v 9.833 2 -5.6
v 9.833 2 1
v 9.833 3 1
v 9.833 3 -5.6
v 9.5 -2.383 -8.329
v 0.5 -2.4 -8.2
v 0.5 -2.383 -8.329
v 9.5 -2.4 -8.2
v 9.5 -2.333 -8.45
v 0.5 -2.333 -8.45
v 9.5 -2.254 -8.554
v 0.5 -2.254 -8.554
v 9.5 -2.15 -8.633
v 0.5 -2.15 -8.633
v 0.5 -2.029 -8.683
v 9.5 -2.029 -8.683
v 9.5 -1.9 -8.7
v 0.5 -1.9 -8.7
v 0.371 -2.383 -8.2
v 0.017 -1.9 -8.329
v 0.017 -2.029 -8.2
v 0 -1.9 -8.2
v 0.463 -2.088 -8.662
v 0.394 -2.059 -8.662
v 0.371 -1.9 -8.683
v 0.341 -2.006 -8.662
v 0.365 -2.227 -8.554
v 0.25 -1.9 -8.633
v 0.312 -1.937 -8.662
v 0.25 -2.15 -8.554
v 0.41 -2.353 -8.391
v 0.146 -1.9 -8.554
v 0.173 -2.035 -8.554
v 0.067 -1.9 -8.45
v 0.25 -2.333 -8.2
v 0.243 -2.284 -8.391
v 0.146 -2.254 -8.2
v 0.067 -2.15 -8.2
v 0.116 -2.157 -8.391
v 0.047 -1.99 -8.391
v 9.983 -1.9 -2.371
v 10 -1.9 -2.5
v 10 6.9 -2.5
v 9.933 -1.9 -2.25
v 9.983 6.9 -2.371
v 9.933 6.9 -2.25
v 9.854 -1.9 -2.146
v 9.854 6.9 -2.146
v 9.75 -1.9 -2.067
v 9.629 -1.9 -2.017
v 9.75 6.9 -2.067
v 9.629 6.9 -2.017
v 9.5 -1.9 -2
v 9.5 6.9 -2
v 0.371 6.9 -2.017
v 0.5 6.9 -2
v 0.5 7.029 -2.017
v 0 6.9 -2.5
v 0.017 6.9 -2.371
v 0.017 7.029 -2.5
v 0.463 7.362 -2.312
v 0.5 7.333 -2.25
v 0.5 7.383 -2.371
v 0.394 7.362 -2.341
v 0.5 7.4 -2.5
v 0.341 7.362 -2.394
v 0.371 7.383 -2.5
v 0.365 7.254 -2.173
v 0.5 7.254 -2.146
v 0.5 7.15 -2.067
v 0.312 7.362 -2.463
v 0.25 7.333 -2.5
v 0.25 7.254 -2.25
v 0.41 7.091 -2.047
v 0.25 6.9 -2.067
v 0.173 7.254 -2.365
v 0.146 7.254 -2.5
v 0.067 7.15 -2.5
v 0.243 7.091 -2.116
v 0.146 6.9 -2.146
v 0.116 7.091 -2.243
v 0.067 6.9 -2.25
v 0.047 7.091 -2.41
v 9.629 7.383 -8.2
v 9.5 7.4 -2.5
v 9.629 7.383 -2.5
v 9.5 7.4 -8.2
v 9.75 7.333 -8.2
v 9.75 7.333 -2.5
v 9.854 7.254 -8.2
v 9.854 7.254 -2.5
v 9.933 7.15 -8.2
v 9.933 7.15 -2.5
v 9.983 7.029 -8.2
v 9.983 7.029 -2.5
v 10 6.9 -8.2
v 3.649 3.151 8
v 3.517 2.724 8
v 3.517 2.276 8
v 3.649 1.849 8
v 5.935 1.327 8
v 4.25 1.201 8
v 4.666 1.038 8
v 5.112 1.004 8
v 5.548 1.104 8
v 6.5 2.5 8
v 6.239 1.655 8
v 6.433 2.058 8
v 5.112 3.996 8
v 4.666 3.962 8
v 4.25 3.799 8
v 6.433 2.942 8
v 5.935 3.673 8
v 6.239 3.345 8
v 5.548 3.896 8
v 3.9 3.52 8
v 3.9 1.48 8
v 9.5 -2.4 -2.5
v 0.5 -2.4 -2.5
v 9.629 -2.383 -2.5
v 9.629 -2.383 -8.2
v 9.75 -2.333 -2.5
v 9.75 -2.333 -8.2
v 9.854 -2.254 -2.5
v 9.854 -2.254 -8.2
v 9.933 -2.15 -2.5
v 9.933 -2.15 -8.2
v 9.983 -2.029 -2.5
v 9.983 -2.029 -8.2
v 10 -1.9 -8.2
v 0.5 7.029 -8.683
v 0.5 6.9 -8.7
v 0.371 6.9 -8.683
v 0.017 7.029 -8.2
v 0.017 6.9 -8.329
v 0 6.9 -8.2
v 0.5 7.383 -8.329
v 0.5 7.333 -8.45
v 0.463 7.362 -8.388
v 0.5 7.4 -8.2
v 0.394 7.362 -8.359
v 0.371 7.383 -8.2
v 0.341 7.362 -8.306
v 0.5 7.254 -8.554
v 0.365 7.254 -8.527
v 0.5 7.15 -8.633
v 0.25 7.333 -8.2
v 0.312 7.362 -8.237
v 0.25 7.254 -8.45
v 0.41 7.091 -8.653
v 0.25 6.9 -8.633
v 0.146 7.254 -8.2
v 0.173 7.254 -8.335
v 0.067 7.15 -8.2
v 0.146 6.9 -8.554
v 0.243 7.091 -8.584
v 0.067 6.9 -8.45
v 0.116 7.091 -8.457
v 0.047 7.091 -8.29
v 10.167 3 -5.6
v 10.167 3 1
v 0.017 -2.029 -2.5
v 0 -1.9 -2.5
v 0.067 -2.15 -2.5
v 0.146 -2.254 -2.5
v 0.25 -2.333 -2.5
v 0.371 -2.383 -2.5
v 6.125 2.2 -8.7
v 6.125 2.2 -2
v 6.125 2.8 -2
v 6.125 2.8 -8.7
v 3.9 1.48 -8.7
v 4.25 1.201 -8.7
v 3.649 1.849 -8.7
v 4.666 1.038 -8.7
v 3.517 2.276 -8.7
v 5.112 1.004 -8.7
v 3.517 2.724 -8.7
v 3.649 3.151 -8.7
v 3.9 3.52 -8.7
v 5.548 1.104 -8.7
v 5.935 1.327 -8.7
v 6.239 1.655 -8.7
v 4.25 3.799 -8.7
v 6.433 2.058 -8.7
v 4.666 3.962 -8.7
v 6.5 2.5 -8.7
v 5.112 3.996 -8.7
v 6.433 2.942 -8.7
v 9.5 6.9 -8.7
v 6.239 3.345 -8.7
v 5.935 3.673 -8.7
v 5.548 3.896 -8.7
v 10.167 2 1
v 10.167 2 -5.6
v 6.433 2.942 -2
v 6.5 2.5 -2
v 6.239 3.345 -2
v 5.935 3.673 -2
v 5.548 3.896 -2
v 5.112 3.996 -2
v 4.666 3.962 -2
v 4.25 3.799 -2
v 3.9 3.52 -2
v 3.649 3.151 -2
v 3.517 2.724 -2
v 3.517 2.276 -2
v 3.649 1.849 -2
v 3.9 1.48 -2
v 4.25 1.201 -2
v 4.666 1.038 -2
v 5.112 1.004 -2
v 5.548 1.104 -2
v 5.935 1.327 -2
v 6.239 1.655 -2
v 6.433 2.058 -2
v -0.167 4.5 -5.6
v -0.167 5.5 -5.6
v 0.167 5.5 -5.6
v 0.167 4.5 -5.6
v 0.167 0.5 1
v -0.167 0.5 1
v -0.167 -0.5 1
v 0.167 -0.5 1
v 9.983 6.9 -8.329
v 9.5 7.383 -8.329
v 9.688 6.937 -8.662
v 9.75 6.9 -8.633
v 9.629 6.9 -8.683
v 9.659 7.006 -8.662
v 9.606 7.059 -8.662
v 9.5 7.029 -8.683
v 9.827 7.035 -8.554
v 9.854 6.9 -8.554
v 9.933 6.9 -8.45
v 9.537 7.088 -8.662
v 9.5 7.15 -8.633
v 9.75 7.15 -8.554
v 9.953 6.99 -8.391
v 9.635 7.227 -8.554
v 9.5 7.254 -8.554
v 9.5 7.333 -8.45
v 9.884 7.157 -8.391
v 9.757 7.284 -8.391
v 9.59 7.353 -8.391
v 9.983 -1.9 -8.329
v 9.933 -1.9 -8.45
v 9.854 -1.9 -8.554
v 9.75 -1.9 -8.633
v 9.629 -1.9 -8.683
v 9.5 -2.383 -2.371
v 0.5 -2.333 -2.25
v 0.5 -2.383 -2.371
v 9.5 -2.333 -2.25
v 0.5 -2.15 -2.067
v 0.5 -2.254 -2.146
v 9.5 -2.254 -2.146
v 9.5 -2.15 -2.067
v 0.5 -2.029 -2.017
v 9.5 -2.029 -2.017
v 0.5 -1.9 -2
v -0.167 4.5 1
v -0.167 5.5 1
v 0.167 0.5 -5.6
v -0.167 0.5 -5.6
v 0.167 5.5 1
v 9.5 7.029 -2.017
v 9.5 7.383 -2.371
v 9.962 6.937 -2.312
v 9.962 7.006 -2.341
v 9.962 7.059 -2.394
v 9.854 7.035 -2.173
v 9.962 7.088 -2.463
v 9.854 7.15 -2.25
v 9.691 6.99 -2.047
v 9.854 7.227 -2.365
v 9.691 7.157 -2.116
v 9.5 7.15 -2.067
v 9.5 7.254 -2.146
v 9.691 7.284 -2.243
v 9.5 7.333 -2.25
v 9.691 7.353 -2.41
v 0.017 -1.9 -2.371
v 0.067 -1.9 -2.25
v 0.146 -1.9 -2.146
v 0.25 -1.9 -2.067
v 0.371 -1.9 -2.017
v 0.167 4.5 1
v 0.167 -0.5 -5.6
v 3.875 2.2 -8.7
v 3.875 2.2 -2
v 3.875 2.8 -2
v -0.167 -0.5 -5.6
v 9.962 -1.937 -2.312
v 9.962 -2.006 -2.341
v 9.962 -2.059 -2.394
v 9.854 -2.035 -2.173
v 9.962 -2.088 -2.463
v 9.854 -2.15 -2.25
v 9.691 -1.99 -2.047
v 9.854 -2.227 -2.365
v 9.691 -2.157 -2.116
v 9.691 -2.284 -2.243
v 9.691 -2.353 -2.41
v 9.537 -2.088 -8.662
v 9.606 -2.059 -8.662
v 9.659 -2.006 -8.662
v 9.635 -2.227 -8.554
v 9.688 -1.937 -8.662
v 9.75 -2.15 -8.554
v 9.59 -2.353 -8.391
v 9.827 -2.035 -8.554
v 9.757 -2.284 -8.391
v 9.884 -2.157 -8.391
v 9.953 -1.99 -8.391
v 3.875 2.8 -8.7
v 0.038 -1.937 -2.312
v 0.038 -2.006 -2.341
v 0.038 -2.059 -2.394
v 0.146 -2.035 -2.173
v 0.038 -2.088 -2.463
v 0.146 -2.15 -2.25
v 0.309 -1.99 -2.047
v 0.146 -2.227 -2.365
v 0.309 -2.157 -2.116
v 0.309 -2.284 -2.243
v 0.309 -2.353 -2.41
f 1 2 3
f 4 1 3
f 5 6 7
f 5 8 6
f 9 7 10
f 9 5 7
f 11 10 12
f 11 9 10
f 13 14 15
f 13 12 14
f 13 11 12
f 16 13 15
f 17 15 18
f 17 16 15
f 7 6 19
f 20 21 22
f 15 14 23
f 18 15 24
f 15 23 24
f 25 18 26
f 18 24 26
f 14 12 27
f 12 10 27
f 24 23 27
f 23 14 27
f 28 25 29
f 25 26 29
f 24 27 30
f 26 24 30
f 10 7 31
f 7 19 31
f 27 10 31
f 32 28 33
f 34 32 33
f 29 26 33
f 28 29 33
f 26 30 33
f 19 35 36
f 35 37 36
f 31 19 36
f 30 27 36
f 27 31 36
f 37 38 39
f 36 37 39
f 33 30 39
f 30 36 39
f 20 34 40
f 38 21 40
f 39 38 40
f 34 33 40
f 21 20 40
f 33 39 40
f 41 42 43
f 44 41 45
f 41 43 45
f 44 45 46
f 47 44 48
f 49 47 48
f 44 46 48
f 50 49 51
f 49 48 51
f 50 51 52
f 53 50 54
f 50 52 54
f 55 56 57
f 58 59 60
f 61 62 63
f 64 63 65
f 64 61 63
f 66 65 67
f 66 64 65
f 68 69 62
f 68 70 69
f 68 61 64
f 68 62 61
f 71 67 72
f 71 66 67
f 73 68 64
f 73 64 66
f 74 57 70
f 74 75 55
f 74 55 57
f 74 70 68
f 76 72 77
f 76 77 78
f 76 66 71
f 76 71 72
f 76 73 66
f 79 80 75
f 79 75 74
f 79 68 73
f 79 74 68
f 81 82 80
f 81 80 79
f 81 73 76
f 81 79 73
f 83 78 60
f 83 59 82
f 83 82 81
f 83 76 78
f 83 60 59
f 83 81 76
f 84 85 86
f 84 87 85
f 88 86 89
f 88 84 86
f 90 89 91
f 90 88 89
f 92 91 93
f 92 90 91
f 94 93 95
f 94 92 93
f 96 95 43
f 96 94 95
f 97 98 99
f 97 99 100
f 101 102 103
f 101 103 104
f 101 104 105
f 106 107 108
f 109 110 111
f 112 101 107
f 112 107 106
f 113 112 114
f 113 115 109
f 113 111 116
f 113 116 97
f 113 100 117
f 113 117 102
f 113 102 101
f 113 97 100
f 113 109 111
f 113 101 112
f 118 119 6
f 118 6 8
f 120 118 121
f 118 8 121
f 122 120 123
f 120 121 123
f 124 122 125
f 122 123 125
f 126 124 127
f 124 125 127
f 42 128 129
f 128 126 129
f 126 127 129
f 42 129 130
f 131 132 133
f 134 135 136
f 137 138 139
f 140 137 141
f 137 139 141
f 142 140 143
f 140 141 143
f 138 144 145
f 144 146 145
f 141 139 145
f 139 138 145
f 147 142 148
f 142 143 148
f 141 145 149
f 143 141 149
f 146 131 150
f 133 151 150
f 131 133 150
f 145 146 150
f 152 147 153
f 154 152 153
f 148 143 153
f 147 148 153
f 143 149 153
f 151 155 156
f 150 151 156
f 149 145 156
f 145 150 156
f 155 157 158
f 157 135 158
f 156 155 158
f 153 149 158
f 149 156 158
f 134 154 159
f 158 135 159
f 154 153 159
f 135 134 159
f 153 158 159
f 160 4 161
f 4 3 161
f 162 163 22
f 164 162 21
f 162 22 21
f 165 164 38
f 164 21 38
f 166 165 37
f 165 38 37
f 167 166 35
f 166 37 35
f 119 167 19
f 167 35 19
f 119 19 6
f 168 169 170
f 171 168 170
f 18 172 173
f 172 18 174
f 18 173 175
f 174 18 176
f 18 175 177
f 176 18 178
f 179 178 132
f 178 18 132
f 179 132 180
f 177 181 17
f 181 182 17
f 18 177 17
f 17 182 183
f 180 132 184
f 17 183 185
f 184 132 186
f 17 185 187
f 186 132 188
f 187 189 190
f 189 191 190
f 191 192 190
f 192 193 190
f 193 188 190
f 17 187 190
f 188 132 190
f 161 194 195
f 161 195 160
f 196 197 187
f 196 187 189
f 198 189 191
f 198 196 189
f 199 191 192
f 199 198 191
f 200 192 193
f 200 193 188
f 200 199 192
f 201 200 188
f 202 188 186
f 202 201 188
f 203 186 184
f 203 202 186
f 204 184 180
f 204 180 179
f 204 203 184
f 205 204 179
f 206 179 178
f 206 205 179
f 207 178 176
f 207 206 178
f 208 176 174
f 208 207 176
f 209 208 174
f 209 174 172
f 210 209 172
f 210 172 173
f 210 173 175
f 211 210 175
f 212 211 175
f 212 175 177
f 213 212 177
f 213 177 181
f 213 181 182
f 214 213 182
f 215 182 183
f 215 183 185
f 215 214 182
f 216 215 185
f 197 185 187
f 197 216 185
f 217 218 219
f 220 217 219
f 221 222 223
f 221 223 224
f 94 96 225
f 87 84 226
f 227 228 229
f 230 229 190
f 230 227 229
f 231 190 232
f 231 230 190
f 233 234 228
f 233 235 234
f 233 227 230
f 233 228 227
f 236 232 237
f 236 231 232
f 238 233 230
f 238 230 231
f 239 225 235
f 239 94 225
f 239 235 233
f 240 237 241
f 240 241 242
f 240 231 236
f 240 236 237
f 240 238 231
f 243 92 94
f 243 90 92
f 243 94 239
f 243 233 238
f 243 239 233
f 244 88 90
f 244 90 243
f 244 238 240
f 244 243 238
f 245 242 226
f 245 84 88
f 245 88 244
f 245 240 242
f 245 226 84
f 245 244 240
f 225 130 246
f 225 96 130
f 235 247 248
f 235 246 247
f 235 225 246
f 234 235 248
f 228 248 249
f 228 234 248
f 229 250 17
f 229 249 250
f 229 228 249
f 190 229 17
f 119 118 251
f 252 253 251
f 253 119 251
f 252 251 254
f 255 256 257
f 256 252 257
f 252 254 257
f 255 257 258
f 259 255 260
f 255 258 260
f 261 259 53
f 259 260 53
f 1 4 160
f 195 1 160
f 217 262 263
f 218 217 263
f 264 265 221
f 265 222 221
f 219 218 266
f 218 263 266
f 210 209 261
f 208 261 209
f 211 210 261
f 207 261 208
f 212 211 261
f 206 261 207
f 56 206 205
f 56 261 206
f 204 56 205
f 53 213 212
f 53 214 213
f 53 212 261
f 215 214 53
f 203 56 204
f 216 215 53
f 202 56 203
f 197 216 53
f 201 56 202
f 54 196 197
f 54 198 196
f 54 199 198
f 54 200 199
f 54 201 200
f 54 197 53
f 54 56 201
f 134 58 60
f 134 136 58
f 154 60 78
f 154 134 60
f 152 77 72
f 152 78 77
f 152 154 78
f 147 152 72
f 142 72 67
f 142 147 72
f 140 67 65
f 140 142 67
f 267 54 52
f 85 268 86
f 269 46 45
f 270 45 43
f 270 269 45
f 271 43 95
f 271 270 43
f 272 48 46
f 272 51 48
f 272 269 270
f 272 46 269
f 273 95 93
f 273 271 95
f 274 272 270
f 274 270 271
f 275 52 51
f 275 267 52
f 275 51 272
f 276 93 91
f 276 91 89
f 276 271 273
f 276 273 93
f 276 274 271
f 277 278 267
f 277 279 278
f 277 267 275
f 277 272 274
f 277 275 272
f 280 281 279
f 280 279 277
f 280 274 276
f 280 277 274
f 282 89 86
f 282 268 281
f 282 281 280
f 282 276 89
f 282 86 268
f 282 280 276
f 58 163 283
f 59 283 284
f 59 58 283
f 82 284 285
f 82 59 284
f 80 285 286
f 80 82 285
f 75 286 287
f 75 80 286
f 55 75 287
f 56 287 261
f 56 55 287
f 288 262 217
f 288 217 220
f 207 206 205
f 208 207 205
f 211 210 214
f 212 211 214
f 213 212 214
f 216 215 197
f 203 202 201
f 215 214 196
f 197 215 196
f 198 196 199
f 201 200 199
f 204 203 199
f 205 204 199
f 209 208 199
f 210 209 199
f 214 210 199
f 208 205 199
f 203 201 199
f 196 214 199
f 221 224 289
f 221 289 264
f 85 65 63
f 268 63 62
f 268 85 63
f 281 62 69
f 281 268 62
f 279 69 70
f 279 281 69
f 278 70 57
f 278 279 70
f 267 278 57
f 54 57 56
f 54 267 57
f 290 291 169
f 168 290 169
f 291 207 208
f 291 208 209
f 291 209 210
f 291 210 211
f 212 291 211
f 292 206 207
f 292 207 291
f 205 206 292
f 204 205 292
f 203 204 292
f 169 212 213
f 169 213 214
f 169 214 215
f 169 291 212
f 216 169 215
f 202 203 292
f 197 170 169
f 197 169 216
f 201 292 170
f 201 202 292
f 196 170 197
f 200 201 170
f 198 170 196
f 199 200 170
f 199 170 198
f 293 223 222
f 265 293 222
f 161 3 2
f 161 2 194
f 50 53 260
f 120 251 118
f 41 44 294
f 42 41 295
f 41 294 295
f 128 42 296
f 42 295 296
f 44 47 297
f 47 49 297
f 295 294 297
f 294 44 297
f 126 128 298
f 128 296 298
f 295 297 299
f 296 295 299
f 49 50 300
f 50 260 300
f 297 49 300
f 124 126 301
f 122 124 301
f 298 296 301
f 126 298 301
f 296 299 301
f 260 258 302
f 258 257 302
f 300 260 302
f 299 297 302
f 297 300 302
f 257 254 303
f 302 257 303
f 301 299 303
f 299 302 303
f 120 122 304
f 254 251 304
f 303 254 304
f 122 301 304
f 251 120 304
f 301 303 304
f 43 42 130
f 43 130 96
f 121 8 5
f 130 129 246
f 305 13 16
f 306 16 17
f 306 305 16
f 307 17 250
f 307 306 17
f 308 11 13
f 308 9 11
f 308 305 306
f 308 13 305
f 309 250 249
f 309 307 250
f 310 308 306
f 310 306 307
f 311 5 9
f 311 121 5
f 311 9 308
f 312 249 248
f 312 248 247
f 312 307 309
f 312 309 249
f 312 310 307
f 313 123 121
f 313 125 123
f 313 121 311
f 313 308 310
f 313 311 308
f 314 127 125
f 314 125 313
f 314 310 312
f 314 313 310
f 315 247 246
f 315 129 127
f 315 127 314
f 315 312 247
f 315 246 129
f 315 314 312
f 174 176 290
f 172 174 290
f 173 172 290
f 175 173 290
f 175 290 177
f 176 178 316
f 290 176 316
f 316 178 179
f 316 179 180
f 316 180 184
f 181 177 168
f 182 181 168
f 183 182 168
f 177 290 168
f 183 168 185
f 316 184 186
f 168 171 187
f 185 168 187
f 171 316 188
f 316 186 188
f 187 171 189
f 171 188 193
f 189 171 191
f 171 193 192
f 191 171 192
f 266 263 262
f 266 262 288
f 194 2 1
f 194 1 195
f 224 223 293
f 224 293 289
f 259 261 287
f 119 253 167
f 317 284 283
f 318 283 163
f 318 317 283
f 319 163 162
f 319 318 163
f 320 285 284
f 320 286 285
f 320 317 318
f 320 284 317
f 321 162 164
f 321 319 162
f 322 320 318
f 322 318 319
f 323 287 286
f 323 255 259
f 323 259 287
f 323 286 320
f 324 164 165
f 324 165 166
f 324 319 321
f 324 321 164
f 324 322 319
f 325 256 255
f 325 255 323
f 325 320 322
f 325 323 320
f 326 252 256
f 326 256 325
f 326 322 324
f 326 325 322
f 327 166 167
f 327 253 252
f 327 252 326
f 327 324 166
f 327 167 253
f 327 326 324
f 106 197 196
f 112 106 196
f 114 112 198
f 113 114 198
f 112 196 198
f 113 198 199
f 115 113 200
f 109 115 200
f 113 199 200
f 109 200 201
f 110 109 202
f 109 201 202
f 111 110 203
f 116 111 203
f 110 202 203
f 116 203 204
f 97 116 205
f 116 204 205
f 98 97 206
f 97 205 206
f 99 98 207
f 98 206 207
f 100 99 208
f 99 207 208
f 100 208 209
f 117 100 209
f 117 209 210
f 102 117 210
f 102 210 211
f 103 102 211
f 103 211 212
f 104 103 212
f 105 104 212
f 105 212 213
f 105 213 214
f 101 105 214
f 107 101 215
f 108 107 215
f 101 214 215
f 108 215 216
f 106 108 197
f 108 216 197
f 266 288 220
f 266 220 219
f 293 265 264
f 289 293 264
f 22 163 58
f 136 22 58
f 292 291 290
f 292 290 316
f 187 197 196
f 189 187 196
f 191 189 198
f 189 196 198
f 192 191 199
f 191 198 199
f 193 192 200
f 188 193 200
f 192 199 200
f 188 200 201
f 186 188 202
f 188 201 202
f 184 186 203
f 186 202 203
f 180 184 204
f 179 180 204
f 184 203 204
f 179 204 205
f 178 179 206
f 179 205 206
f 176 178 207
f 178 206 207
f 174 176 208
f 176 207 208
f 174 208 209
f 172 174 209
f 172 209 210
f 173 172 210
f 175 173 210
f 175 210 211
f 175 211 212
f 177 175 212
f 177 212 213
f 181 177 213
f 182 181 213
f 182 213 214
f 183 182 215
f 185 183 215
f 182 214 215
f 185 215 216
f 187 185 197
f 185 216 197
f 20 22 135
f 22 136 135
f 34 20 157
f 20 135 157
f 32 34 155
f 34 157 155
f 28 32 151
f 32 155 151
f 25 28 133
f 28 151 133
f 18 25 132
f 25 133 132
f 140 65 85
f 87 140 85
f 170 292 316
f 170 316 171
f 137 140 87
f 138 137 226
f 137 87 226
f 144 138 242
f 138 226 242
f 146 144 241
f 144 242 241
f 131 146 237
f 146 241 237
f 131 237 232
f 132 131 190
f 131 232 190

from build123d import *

# Parameters (mm, degrees)
SKETCH003_W       = 0.333334
SKETCH003_H       = 1
PAD002_DEPTH      = 1
PAD002_DEPTH_BACK = 5.6
SKETCH004_R       = 1.5
SKETCH004_W       = 2.25
SKETCH004_H       = 0.6
PAD003_DEPTH      = 6.7
SKETCH006_R       = 1.5
PAD005_DEPTH      = 10
SKETCH_W          = 10
SKETCH_H          = 9.8
SKETCH_R          = 1.5
PAD_DEPTH         = 6.7
FILLET_R          = 0.5


with BuildPart() as pad002:
    # Sketch003 → Pad002 (new body, two sides)
    with BuildSketch(Plane(origin=(0, 5, 0), x_dir=(1, 0, 0), z_dir=(0, 0, 1))) as pad002_sk:
        Rectangle(SKETCH003_W, SKETCH003_H)
        with Locations((10, -2.5)):
            Rectangle(SKETCH003_W, SKETCH003_H)
        with Locations((0, -5)):
            Rectangle(SKETCH003_W, SKETCH003_H)
    extrude(amount=PAD002_DEPTH)
    extrude(pad002_sk.sketch, amount=-PAD002_DEPTH_BACK)


with BuildPart() as pad003:
    # Sketch004 → Pad003 (new body)
    with BuildSketch(Plane(origin=(0, 5, -2), x_dir=(1, 0, 0), z_dir=(0, 0, 1))):
        with Locations((5, -2.5)):
            Circle(SKETCH004_R)
        with Locations((5, -2.5)):
            Rectangle(SKETCH004_W, SKETCH004_H, mode=Mode.SUBTRACT)
    extrude(amount=-PAD003_DEPTH)


with BuildPart() as pad005:
    # Sketch006 → Pad005 (new body)
    with BuildSketch(Plane(origin=(0, 5, -2), x_dir=(1, 0, 0), z_dir=(0, 0, 1))):
        with Locations((5, -2.5)):
            Circle(SKETCH006_R)
    extrude(amount=PAD005_DEPTH)


with BuildPart() as fillet_body:
    # Sketch → Pad (new body)
    with BuildSketch(Plane(origin=(0, 5, -2), x_dir=(1, 0, 0), z_dir=(0, 0, 1))):
        with Locations((5, -2.5)):
            Rectangle(SKETCH_W, SKETCH_H)
        with Locations((5, -2.5)):
            Circle(SKETCH_R, mode=Mode.SUBTRACT)
    extrude(amount=-PAD_DEPTH)

    # Fillet
    fillet_edges = [fillet_body.edges().sort_by_distance(p)[0] for p in [
        (5, -2.4, -2),
        (0, 2.5, -2),
        (5, 7.4, -2),
        (10, 2.5, -2),
        (10, 7.4, -5.35),
        (10, -2.4, -5.35),
        (0, -2.4, -5.35),
        (5, -2.4, -8.7),
        (10, 2.5, -8.7),
        (0, 2.5, -8.7),
        (5, 7.4, -8.7),
        (0, 7.4, -5.35),
    ]]
    fillet(fillet_edges, radius=FILLET_R)


solid = Compound([pad002.part, pad003.part, pad005.part, fillet_body.part])
